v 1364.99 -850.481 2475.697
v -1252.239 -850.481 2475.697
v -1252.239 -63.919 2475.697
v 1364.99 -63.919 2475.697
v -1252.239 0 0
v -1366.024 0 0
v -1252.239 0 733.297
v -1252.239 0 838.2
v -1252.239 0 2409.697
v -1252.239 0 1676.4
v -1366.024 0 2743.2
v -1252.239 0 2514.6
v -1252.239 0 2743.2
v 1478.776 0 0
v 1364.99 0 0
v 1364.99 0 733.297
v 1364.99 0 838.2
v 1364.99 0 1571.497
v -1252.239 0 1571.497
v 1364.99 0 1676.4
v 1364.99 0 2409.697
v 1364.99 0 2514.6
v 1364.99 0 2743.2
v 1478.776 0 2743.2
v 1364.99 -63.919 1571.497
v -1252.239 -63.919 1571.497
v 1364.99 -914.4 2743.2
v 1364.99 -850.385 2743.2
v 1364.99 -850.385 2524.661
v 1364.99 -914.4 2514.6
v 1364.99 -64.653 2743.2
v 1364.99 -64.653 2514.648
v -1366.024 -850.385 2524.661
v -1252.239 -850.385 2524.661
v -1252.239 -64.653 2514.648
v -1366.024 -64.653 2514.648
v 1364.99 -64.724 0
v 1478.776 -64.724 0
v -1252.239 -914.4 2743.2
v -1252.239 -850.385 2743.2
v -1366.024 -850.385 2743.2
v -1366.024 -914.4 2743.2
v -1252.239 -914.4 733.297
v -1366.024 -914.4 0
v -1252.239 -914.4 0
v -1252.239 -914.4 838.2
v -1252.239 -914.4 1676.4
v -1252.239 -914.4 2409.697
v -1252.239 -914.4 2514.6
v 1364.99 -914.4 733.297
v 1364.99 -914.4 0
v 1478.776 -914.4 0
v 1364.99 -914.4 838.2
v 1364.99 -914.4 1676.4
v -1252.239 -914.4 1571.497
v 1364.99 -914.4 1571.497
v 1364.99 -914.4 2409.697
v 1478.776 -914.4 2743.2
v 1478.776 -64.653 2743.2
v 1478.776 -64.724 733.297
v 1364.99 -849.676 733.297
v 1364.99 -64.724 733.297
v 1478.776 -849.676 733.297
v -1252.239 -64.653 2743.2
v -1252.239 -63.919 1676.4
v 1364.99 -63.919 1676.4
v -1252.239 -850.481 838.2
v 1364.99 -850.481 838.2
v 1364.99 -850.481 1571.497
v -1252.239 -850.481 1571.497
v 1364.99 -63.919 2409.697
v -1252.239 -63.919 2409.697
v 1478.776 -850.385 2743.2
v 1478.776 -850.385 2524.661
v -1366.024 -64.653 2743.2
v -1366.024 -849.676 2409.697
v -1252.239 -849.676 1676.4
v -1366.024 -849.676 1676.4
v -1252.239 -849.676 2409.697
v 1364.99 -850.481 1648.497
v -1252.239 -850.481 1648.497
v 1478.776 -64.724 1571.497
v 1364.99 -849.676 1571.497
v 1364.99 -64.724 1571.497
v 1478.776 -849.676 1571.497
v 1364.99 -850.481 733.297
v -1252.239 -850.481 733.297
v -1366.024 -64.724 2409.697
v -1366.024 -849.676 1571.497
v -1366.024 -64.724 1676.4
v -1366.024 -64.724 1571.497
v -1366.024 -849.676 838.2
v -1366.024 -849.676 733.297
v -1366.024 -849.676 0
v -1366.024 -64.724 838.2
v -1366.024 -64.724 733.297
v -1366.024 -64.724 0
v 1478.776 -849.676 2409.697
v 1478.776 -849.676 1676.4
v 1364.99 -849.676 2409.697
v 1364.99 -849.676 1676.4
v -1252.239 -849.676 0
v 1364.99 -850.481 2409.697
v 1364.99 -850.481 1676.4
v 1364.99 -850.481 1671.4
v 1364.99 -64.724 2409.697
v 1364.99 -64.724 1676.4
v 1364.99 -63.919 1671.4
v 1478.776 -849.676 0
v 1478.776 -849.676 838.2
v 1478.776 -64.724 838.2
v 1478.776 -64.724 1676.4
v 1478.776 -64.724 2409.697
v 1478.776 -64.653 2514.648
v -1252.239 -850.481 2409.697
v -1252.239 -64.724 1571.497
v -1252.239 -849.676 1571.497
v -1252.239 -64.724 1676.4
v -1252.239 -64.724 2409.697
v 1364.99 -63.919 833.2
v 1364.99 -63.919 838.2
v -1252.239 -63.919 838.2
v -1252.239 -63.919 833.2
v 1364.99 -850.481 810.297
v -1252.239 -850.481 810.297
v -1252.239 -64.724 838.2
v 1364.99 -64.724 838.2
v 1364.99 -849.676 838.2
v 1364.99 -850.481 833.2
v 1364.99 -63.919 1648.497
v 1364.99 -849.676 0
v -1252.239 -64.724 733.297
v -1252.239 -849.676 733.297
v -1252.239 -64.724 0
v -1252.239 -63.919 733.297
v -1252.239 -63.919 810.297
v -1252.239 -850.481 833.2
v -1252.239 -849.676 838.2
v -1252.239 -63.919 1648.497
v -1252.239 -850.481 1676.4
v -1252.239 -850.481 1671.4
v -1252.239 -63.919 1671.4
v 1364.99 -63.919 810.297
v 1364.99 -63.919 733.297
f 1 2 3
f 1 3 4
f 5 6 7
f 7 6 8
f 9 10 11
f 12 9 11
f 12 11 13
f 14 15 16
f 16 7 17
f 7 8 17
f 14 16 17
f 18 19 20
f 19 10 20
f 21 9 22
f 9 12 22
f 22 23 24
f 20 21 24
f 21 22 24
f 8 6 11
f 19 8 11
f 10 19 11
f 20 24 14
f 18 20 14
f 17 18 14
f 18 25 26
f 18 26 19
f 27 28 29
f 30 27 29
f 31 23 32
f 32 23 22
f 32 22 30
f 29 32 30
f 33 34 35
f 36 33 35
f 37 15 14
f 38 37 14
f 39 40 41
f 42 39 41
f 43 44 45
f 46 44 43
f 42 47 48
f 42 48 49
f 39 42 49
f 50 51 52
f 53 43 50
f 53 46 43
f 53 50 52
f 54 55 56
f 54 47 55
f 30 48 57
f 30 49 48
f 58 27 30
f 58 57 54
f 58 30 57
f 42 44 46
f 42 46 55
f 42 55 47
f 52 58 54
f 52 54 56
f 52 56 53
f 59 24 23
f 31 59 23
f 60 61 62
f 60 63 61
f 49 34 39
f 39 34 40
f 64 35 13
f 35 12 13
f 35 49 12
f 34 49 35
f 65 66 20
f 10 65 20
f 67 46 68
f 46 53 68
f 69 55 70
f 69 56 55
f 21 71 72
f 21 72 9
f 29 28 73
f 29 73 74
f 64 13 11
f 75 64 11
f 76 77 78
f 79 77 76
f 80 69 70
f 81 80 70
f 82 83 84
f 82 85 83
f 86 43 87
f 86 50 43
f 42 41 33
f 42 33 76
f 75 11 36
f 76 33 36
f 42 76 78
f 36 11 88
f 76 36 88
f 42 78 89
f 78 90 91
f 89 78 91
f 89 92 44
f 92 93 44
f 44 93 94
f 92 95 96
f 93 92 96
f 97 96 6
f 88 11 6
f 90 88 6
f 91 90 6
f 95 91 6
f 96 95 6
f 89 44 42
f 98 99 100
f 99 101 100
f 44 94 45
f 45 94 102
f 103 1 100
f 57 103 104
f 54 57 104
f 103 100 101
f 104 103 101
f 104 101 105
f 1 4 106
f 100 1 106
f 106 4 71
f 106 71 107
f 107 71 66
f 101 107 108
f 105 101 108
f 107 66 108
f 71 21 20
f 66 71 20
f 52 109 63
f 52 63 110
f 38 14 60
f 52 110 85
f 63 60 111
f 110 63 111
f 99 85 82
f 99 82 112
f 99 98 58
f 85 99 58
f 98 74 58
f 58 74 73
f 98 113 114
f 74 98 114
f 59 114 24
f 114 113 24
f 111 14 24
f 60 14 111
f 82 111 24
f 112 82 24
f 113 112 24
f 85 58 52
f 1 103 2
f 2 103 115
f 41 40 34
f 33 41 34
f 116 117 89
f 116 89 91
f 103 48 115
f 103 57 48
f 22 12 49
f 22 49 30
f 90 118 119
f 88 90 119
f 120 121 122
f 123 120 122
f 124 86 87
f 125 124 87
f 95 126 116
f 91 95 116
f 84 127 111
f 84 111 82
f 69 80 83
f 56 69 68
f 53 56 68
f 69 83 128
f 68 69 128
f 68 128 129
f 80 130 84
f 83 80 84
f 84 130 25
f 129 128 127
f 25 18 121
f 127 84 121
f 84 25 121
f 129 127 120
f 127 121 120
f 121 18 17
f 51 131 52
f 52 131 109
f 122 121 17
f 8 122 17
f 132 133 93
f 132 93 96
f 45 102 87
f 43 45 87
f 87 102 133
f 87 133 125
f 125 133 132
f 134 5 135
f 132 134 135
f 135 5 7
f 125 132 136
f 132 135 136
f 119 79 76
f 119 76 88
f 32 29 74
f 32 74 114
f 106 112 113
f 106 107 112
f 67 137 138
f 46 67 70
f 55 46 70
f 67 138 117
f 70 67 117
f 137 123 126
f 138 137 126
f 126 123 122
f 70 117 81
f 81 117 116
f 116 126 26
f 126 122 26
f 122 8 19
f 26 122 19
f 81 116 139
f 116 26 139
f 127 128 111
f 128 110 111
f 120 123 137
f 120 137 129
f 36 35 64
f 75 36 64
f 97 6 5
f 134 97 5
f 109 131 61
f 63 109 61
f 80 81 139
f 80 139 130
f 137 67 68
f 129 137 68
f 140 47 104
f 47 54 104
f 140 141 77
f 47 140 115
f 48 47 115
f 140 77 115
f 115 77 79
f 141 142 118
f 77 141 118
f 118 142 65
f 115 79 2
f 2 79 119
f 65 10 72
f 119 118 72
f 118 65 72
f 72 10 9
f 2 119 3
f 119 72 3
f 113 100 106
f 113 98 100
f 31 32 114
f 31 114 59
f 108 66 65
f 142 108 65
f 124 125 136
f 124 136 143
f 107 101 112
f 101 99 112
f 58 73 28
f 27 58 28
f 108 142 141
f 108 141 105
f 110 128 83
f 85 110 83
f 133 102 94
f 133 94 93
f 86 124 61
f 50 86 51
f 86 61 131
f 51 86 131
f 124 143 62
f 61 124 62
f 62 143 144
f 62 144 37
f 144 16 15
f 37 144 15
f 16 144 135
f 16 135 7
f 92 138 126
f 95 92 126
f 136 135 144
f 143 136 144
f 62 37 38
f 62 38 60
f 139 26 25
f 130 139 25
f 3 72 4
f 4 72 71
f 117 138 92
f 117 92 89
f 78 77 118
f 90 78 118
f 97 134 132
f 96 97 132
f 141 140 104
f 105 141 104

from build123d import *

# Parameters (mm, degrees)
F0_W          = 2617.2294904932
F0_H          = 104.903
F1_DEPTH      = 914.4
F2_W          = 784.9525028229
F2_H          = 733.297
F3_DEPTH      = 113.7862547534
F3_DEPTH_BACK = 5040
F4_W          = 784.9525028229
F4_H          = 733.297
F5_DEPTH      = 113.7862547534
F5_DEPTH_BACK = 3796
F6_W          = 784.9525028229
F6_H          = 733.297
F7_DEPTH      = 113.7862547534
F7_DEPTH_BACK = 4910
F9_DEPTH      = 650
F9_DEPTH_BACK = 3377
F11_DEPTH     = 66
F13_DEPTH     = 77
F15_DEPTH     = 77
F17_DEPTH     = 5
F19_DEPTH     = 5


with BuildPart() as f1:
    # F0 (on Front) → F1 (new body)
    with BuildSketch(Plane.XZ):
        Polygon((-1366.024362839, 2743.2), (-1366.024362839, 0), (-1252.2391080856, 0), (-1252.2391080856, 733.297), (-1252.2391080856, 838.2), (-1252.2391080856, 1571.497), (-1252.2391080856, 1676.4), (-1252.2391080856, 2409.697), (-1252.2391080856, 2514.6), (-1252.2391080856, 2743.2), align=None)
        with Locations((56.375637161, 2462.1485)):
            Rectangle(F0_W, F0_H)
        Polygon((1364.9903824076, 838.2), (1364.9903824076, 733.297), (1364.9903824076, 0), (1478.775637161, 0), (1478.775637161, 2743.2), (1364.9903824076, 2743.2), (1364.9903824076, 2514.6), (1364.9903824076, 2409.697), (1364.9903824076, 1676.4), (1364.9903824076, 1571.497), align=None)
        with Locations((56.375637161, 1623.9485)):
            Rectangle(F0_W, F0_H)
        with Locations((56.375637161, 785.7485)):
            Rectangle(F0_W, F0_H)
    extrude(amount=F1_DEPTH)

    # F2 (on face) → F3 (cut, two sides)
    with BuildSketch(Plane.YZ.offset(-1252.2391080856)) as f3_sk:
        with Locations((-457.2, 2043.0485)):
            Rectangle(F2_W, F2_H)
    extrude(amount=-F3_DEPTH, mode=Mode.SUBTRACT)
    extrude(f3_sk.sketch, amount=F3_DEPTH_BACK, mode=Mode.SUBTRACT)

    # F4 (on face) → F5 (cut, two sides)
    with BuildSketch(Plane.YZ.offset(-1252.2391080856)) as f5_sk:
        with Locations((-457.2, 366.6485)):
            Rectangle(F4_W, F4_H)
    extrude(amount=-F5_DEPTH, mode=Mode.SUBTRACT)
    extrude(f5_sk.sketch, amount=F5_DEPTH_BACK, mode=Mode.SUBTRACT)

    # F6 (on face) → F7 (cut, two sides)
    with BuildSketch(Plane.YZ.offset(-1252.2391080856)) as f7_sk:
        with Locations((-457.2, 1204.8485)):
            Rectangle(F6_W, F6_H)
    extrude(amount=-F7_DEPTH, mode=Mode.SUBTRACT)
    extrude(f7_sk.sketch, amount=F7_DEPTH_BACK, mode=Mode.SUBTRACT)

    # F8 (on face) → F9 (cut, two sides)
    with BuildSketch(Plane.YZ.offset(-1252.2391080856)) as f9_sk:
        Polygon((-850.3850175618, 2743.2), (-850.3850175618, 2524.6608597206), (-64.6533628224, 2514.6482582703), (-64.6533628224, 2743.2), align=None)
    extrude(amount=-F9_DEPTH, mode=Mode.SUBTRACT)
    extrude(f9_sk.sketch, amount=F9_DEPTH_BACK, mode=Mode.SUBTRACT)

    # F10 (on face) → F11 (cut)
    with BuildSketch(Plane(origin=(0, 0, 2409.697), x_dir=(1, 0, 0), z_dir=(0, 0, -1))):
        Polygon((1364.9903824076, 850.4807184756), (-1252.2391080856, 850.4807184756), (-1252.2391080856, 849.6762514114), (-1252.2391080856, 64.7237485886), (-1252.2391080856, 63.9192815244), (1364.9903824076, 63.9192815244), (1364.9903824076, 64.7237485886), (1364.9903824076, 849.6762514114), align=None)
    extrude(amount=-F11_DEPTH, mode=Mode.SUBTRACT)

    # F12 (on face) → F13 (cut)
    with BuildSketch(Plane(origin=(0, 0, 1571.497), x_dir=(1, 0, 0), z_dir=(0, 0, -1))):
        Polygon((1364.9903824076, 850.4807184756), (-1252.2391080856, 850.4807184756), (-1252.2391080856, 849.6762514114), (-1252.2391080856, 64.7237485886), (-1252.2391080856, 63.9192815244), (1364.9903824076, 63.9192815244), (1364.9903824076, 64.7237485886), (1364.9903824076, 849.6762514114), align=None)
    extrude(amount=-F13_DEPTH, mode=Mode.SUBTRACT)

    # F14 (on face) + F3_face1 (on face) → F15 (cut)
    with BuildSketch(Plane(origin=(0, 0, 733.297), x_dir=(1, 0, 0), z_dir=(0, 0, -1))):
        Polygon((1364.9903824076, 850.4807184756), (-1252.2391080856, 850.4807184756), (-1252.2391080856, 849.6762514114), (-1252.2391080856, 64.7237485886), (-1252.2391080856, 63.9192815244), (1364.9903824076, 63.9192815244), (1364.9903824076, 64.7237485886), (1364.9903824076, 849.6762514114), align=None)
    with BuildSketch(Plane(origin=(56.375637161, -457.2, 1676.4), x_dir=(1, 0, 0), z_dir=(0, 0, 1))):
        Polygon((-1308.6147452466, 392.4762514114), (-1422.4, 392.4762514114), (-1422.4, -392.4762514114), (-1308.6147452466, -392.4762514114), (-1308.6147452466, -457.2), (1308.6147452466, -457.2), (1308.6147452466, -392.4762514114), (1422.4, -392.4762514114), (1422.4, 392.4762514114), (1308.6147452466, 392.4762514114), (1308.6147452466, 457.2), (-1308.6147452466, 457.2), align=None)
    extrude(amount=-F15_DEPTH, dir=(0, 0, -1), mode=Mode.SUBTRACT)

    # F16 (on face) → F17 (cut)
    with BuildSketch(Plane.XY.offset(1676.4)):
        Polygon((1364.9903824076, -63.9192815244), (-1252.2391080856, -63.9192815244), (-1252.2391080856, -64.7237485886), (-1252.2391080856, -849.6762514114), (-1252.2391080856, -850.4807184756), (1364.9903824076, -850.4807184756), (1364.9903824076, -849.6762514114), (1364.9903824076, -64.7237485886), align=None)
    extrude(amount=-F17_DEPTH, mode=Mode.SUBTRACT)

    # F18 (on face) → F19 (cut)
    with BuildSketch(Plane.XY.offset(838.2)):
        Polygon((1364.9903824076, -63.9192815244), (-1252.2391080856, -63.9192815244), (-1252.2391080856, -64.7237485886), (-1252.2391080856, -849.6762514114), (-1252.2391080856, -850.4807184756), (1364.9903824076, -850.4807184756), (1364.9903824076, -849.6762514114), (1364.9903824076, -64.7237485886), align=None)
    extrude(amount=-F19_DEPTH, mode=Mode.SUBTRACT)


solid = f1.part
